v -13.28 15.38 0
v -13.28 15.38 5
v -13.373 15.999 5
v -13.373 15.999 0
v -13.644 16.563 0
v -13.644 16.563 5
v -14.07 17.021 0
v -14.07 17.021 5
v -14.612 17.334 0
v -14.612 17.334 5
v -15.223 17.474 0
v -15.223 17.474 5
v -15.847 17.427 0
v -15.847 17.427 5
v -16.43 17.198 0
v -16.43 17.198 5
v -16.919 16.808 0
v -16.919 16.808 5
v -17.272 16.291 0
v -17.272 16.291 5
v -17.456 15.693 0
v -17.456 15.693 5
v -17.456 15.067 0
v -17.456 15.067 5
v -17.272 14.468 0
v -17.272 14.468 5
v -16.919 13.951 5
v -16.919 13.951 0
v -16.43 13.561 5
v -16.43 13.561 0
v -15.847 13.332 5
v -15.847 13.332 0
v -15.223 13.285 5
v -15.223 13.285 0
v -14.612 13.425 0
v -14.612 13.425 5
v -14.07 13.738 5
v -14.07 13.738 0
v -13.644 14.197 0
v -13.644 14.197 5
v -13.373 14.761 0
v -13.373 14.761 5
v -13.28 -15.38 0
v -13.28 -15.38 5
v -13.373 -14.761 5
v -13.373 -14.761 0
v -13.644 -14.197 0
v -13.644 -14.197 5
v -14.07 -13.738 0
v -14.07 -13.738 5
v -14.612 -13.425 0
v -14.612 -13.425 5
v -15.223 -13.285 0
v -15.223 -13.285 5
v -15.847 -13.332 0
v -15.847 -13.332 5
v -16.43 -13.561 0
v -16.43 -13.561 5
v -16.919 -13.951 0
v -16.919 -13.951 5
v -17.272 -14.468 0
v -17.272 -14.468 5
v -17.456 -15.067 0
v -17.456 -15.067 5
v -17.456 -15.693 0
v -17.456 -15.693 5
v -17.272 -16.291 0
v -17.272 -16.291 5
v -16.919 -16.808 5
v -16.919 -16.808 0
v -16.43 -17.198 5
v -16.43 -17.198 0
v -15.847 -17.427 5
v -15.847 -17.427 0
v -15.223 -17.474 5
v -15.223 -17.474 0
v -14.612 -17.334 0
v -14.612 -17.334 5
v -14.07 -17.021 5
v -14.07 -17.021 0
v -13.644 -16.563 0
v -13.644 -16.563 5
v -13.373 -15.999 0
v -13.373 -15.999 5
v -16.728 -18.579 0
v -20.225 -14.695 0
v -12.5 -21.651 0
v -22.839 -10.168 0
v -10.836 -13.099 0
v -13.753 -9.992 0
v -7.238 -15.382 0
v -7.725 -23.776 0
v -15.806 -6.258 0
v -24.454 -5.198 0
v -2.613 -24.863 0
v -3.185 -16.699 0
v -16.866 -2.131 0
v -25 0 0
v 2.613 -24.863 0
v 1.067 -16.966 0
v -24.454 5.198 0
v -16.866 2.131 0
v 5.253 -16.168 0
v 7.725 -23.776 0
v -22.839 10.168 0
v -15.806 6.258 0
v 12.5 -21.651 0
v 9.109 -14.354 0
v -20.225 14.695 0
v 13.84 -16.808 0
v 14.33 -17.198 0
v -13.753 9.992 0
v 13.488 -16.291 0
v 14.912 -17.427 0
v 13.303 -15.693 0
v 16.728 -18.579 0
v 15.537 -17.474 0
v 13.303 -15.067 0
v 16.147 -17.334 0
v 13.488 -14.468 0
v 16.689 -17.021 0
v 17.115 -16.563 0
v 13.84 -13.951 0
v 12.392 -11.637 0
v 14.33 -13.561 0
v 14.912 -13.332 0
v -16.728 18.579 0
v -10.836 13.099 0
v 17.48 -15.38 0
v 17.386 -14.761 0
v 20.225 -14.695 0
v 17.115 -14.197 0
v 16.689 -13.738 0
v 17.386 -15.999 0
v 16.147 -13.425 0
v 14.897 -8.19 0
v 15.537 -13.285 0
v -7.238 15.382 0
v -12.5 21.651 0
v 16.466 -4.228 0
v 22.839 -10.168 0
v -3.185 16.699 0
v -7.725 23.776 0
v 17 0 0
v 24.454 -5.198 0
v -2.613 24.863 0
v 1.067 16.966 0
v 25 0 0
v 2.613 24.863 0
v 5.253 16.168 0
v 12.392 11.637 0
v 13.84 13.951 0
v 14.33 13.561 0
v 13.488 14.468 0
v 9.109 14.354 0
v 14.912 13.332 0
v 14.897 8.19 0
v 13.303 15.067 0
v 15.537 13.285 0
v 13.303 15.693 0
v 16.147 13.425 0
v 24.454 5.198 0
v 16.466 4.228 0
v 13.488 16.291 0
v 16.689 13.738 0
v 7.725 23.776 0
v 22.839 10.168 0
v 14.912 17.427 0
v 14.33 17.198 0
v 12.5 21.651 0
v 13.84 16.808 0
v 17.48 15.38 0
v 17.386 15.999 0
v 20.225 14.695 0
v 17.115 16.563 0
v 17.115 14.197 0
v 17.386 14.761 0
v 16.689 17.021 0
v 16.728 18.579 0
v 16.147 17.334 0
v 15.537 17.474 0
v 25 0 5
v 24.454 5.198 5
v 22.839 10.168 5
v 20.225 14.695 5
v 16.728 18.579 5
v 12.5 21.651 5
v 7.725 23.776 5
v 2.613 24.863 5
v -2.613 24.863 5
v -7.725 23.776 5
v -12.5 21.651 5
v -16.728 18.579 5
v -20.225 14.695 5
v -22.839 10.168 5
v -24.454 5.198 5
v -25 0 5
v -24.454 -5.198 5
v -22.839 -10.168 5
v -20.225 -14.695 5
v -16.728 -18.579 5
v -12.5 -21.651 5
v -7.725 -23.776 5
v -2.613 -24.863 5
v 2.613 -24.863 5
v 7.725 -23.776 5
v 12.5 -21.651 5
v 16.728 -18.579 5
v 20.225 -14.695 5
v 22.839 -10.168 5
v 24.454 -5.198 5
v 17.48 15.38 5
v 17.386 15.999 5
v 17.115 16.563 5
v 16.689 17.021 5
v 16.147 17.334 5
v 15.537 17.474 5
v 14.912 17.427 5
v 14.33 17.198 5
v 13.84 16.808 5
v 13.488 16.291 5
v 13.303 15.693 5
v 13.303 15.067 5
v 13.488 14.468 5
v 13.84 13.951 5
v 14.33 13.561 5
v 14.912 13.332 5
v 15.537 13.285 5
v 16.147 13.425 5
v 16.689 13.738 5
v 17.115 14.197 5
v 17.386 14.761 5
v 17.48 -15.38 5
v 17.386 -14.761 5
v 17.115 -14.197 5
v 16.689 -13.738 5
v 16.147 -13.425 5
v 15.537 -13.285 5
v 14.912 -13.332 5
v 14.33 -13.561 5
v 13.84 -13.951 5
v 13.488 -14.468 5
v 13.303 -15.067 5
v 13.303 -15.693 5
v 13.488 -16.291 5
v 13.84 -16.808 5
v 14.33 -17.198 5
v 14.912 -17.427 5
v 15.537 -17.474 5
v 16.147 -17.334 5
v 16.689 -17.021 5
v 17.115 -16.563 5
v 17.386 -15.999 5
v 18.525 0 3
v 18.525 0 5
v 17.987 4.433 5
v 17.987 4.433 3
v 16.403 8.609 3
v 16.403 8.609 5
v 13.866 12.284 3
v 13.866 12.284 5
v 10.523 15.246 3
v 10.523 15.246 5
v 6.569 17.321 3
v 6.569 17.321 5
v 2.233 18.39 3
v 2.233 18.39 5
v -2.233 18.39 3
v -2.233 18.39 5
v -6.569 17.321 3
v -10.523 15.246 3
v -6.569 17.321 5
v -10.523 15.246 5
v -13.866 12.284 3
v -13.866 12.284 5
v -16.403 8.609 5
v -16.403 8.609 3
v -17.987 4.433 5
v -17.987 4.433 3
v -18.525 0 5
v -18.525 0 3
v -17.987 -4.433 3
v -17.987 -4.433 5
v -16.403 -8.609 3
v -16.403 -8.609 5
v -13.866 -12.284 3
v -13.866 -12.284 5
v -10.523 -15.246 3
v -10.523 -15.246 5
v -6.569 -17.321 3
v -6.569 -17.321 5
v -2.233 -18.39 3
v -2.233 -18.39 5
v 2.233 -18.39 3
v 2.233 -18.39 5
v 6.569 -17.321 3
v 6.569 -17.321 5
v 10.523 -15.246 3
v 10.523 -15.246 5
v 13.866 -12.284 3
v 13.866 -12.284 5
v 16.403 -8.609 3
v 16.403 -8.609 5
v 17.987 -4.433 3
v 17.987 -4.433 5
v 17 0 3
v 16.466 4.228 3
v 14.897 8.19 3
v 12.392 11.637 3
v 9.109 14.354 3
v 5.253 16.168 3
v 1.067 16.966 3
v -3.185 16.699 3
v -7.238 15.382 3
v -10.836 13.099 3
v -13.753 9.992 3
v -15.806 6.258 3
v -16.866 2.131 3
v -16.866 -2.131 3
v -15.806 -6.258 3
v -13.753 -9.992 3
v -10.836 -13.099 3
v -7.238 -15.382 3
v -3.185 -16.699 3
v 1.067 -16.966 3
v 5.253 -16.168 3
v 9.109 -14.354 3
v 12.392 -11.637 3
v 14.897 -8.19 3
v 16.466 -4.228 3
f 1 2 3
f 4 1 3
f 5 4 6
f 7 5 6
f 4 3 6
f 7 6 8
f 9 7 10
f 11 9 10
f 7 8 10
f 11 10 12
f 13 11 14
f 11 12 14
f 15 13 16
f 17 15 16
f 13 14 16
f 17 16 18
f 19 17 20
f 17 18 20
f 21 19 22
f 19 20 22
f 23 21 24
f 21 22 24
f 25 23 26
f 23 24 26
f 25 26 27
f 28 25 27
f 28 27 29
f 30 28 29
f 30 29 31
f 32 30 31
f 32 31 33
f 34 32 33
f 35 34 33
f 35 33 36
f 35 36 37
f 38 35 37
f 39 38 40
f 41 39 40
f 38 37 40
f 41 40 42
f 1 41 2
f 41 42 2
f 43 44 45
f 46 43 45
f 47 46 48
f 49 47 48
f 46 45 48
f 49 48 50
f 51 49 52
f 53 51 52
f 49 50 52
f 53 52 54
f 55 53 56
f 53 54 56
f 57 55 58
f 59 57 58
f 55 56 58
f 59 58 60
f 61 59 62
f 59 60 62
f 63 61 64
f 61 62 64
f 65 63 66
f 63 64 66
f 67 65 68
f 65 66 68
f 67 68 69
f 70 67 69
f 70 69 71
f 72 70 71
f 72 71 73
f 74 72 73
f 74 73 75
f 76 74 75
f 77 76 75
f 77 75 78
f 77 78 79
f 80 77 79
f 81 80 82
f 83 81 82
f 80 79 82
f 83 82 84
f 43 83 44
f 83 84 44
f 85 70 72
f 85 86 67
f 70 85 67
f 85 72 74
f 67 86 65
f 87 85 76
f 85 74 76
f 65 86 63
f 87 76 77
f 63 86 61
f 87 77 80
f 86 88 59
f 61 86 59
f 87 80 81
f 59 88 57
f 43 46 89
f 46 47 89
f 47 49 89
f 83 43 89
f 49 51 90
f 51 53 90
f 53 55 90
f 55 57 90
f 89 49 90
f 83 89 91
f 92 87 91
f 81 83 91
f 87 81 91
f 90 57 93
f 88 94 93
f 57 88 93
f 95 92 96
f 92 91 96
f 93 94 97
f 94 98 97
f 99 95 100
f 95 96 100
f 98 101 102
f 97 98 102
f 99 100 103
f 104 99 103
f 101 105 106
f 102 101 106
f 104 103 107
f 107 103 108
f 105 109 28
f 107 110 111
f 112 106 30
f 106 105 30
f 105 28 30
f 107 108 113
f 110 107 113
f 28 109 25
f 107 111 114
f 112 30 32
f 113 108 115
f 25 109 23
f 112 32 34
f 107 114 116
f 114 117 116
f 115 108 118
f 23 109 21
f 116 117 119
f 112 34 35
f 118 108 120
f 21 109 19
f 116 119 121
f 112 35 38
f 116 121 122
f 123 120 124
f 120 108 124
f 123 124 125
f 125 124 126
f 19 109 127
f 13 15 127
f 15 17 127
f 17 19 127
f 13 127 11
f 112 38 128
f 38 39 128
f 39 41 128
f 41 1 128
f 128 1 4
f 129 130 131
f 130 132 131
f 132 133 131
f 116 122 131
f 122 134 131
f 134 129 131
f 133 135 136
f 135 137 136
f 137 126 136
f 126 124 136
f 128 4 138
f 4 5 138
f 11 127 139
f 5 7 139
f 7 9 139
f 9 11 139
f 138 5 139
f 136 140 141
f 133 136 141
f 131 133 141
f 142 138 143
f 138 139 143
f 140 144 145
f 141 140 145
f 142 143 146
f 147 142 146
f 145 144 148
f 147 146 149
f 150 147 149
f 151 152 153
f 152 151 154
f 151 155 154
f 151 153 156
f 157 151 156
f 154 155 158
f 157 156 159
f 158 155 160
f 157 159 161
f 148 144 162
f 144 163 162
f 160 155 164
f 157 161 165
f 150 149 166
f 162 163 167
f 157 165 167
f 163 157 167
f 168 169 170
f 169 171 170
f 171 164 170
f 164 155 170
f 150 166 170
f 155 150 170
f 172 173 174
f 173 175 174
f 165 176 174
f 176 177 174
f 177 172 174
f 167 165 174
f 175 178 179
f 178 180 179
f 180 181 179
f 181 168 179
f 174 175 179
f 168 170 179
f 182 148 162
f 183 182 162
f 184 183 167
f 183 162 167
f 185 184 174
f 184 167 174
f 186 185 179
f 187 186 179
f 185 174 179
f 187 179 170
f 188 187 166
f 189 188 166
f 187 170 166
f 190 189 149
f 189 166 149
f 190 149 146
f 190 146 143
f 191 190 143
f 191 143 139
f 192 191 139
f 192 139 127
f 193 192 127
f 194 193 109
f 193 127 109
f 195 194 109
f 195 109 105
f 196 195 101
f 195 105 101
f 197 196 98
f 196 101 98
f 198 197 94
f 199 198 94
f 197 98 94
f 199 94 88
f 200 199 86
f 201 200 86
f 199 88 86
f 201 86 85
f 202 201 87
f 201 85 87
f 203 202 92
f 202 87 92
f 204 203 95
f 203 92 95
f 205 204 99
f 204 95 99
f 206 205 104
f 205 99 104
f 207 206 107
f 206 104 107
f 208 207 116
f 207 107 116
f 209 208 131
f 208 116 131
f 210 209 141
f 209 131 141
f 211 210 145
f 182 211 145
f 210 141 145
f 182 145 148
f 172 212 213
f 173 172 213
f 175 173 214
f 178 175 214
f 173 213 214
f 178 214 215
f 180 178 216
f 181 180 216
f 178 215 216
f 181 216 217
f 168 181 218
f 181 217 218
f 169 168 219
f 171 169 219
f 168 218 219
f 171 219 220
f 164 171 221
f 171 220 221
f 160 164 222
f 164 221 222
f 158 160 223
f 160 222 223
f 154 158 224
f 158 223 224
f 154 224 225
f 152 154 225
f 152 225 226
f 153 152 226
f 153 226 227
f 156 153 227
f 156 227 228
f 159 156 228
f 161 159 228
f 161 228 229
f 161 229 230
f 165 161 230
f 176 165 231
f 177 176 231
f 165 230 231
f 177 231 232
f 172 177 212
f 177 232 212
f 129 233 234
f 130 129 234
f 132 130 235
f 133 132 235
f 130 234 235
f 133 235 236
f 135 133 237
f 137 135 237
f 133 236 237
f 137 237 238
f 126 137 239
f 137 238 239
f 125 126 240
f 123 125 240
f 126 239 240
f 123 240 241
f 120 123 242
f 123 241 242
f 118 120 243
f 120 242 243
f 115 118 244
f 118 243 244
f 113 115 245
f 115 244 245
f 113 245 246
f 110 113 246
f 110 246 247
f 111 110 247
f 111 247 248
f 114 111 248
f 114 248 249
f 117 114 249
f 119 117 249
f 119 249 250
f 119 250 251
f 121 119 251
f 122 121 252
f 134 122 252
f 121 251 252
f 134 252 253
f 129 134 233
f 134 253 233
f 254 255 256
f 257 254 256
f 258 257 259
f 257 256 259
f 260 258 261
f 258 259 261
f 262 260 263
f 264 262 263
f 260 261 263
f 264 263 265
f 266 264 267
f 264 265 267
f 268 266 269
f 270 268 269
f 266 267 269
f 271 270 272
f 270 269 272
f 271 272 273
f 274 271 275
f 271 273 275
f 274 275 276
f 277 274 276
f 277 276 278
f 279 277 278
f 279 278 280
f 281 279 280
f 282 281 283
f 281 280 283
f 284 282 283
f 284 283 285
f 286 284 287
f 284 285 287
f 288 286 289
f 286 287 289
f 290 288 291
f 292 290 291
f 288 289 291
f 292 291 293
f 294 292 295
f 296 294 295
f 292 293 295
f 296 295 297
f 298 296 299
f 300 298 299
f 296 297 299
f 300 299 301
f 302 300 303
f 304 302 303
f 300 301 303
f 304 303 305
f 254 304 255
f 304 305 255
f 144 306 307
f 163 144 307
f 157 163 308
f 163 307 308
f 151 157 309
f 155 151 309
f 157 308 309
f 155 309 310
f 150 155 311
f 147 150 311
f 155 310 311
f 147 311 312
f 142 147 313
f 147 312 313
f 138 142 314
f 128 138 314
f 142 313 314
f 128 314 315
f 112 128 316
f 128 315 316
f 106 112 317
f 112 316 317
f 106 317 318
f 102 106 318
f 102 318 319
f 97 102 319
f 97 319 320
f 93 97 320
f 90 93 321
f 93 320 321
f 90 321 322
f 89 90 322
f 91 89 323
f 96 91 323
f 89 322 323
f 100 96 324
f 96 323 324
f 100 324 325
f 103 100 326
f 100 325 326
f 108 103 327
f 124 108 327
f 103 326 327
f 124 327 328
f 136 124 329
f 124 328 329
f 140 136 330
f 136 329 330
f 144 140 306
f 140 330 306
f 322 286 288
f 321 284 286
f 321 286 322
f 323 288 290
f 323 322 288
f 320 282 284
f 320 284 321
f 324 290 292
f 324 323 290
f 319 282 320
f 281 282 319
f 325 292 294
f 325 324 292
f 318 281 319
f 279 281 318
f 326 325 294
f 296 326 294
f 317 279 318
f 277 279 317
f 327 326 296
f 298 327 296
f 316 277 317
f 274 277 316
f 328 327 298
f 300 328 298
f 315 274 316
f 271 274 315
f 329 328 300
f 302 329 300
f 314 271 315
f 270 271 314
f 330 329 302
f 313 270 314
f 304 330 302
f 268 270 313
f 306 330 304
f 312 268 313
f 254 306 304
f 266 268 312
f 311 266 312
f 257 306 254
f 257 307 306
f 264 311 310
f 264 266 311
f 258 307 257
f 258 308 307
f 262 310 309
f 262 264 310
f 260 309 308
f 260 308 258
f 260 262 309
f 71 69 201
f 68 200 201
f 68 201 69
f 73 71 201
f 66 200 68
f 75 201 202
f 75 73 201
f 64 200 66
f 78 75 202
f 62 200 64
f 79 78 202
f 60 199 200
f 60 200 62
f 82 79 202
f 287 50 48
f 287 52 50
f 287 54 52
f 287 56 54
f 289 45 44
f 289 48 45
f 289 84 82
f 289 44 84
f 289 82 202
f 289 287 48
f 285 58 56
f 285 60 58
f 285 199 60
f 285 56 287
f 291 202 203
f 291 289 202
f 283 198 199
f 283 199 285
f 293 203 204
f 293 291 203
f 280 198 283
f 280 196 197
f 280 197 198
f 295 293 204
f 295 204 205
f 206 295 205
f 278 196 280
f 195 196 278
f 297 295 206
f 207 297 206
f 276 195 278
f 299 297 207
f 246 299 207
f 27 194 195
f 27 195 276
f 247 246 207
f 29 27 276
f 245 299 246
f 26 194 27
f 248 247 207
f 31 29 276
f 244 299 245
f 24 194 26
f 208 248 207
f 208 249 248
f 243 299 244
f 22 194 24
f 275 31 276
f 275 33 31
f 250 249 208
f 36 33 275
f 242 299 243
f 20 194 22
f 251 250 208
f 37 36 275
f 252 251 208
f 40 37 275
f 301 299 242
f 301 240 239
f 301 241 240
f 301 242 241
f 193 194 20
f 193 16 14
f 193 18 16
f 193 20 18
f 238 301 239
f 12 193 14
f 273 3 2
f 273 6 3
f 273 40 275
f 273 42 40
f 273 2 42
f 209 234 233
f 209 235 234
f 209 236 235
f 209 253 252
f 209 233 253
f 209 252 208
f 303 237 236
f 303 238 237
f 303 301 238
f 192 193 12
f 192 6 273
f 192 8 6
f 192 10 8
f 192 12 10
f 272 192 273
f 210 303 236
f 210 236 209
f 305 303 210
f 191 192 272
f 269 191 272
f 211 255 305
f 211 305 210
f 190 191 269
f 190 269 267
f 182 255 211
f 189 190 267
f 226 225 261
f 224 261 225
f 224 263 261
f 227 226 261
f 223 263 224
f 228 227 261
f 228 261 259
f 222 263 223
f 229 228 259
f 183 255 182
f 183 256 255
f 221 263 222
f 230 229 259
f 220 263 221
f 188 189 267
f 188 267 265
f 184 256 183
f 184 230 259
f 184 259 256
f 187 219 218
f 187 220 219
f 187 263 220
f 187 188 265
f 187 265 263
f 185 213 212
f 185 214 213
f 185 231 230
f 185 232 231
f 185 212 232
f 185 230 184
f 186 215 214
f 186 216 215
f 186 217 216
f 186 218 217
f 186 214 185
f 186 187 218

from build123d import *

# Parameters (mm, degrees)
SKETCH_1_R          = 25
EXTRUDE_1_DEPTH     = 5
SKETCH_2_R          = 18.525
CUT_EXTRUDE_1_DEPTH = 2
SKETCH_3_R          = 17
CUT_EXTRUDE_2_DEPTH = 3
SKETCH_4_R          = 2.1
CUT_EXTRUDE_3_DEPTH = 5


with BuildPart() as part:
    # ｽｹｯﾁ1 → ﾎﾞｽ - 押し出し1 (new body)
    with BuildSketch(Plane.XY):
        Circle(SKETCH_1_R)
    extrude(amount=EXTRUDE_1_DEPTH)

    # ｽｹｯﾁ2 → ｶｯﾄ - 押し出し1 (cut)
    with BuildSketch(Plane.XY.offset(5)):
        Circle(SKETCH_2_R)
    extrude(amount=-CUT_EXTRUDE_1_DEPTH, mode=Mode.SUBTRACT)

    # ｽｹｯﾁ3 → ｶｯﾄ - 押し出し2 (cut)
    with BuildSketch(Plane.XY.offset(3)):
        Circle(SKETCH_3_R)
    extrude(amount=-CUT_EXTRUDE_2_DEPTH, mode=Mode.SUBTRACT)

    # ｽｹｯﾁ4 → ｶｯﾄ - 押し出し3 (cut)
    with BuildSketch(Plane.XY.offset(5)):
        with Locations((15.379572491, 15.379572491)):
            Circle(SKETCH_4_R)
        with Locations((15.379572491, -15.379572491)):
            Circle(SKETCH_4_R)
        with Locations((-15.379572491, -15.379572491)):
            Circle(SKETCH_4_R)
        with Locations((-15.379572491, 15.379572491)):
            Circle(SKETCH_4_R)
    extrude(amount=-CUT_EXTRUDE_3_DEPTH, mode=Mode.SUBTRACT)


solid = part.part
